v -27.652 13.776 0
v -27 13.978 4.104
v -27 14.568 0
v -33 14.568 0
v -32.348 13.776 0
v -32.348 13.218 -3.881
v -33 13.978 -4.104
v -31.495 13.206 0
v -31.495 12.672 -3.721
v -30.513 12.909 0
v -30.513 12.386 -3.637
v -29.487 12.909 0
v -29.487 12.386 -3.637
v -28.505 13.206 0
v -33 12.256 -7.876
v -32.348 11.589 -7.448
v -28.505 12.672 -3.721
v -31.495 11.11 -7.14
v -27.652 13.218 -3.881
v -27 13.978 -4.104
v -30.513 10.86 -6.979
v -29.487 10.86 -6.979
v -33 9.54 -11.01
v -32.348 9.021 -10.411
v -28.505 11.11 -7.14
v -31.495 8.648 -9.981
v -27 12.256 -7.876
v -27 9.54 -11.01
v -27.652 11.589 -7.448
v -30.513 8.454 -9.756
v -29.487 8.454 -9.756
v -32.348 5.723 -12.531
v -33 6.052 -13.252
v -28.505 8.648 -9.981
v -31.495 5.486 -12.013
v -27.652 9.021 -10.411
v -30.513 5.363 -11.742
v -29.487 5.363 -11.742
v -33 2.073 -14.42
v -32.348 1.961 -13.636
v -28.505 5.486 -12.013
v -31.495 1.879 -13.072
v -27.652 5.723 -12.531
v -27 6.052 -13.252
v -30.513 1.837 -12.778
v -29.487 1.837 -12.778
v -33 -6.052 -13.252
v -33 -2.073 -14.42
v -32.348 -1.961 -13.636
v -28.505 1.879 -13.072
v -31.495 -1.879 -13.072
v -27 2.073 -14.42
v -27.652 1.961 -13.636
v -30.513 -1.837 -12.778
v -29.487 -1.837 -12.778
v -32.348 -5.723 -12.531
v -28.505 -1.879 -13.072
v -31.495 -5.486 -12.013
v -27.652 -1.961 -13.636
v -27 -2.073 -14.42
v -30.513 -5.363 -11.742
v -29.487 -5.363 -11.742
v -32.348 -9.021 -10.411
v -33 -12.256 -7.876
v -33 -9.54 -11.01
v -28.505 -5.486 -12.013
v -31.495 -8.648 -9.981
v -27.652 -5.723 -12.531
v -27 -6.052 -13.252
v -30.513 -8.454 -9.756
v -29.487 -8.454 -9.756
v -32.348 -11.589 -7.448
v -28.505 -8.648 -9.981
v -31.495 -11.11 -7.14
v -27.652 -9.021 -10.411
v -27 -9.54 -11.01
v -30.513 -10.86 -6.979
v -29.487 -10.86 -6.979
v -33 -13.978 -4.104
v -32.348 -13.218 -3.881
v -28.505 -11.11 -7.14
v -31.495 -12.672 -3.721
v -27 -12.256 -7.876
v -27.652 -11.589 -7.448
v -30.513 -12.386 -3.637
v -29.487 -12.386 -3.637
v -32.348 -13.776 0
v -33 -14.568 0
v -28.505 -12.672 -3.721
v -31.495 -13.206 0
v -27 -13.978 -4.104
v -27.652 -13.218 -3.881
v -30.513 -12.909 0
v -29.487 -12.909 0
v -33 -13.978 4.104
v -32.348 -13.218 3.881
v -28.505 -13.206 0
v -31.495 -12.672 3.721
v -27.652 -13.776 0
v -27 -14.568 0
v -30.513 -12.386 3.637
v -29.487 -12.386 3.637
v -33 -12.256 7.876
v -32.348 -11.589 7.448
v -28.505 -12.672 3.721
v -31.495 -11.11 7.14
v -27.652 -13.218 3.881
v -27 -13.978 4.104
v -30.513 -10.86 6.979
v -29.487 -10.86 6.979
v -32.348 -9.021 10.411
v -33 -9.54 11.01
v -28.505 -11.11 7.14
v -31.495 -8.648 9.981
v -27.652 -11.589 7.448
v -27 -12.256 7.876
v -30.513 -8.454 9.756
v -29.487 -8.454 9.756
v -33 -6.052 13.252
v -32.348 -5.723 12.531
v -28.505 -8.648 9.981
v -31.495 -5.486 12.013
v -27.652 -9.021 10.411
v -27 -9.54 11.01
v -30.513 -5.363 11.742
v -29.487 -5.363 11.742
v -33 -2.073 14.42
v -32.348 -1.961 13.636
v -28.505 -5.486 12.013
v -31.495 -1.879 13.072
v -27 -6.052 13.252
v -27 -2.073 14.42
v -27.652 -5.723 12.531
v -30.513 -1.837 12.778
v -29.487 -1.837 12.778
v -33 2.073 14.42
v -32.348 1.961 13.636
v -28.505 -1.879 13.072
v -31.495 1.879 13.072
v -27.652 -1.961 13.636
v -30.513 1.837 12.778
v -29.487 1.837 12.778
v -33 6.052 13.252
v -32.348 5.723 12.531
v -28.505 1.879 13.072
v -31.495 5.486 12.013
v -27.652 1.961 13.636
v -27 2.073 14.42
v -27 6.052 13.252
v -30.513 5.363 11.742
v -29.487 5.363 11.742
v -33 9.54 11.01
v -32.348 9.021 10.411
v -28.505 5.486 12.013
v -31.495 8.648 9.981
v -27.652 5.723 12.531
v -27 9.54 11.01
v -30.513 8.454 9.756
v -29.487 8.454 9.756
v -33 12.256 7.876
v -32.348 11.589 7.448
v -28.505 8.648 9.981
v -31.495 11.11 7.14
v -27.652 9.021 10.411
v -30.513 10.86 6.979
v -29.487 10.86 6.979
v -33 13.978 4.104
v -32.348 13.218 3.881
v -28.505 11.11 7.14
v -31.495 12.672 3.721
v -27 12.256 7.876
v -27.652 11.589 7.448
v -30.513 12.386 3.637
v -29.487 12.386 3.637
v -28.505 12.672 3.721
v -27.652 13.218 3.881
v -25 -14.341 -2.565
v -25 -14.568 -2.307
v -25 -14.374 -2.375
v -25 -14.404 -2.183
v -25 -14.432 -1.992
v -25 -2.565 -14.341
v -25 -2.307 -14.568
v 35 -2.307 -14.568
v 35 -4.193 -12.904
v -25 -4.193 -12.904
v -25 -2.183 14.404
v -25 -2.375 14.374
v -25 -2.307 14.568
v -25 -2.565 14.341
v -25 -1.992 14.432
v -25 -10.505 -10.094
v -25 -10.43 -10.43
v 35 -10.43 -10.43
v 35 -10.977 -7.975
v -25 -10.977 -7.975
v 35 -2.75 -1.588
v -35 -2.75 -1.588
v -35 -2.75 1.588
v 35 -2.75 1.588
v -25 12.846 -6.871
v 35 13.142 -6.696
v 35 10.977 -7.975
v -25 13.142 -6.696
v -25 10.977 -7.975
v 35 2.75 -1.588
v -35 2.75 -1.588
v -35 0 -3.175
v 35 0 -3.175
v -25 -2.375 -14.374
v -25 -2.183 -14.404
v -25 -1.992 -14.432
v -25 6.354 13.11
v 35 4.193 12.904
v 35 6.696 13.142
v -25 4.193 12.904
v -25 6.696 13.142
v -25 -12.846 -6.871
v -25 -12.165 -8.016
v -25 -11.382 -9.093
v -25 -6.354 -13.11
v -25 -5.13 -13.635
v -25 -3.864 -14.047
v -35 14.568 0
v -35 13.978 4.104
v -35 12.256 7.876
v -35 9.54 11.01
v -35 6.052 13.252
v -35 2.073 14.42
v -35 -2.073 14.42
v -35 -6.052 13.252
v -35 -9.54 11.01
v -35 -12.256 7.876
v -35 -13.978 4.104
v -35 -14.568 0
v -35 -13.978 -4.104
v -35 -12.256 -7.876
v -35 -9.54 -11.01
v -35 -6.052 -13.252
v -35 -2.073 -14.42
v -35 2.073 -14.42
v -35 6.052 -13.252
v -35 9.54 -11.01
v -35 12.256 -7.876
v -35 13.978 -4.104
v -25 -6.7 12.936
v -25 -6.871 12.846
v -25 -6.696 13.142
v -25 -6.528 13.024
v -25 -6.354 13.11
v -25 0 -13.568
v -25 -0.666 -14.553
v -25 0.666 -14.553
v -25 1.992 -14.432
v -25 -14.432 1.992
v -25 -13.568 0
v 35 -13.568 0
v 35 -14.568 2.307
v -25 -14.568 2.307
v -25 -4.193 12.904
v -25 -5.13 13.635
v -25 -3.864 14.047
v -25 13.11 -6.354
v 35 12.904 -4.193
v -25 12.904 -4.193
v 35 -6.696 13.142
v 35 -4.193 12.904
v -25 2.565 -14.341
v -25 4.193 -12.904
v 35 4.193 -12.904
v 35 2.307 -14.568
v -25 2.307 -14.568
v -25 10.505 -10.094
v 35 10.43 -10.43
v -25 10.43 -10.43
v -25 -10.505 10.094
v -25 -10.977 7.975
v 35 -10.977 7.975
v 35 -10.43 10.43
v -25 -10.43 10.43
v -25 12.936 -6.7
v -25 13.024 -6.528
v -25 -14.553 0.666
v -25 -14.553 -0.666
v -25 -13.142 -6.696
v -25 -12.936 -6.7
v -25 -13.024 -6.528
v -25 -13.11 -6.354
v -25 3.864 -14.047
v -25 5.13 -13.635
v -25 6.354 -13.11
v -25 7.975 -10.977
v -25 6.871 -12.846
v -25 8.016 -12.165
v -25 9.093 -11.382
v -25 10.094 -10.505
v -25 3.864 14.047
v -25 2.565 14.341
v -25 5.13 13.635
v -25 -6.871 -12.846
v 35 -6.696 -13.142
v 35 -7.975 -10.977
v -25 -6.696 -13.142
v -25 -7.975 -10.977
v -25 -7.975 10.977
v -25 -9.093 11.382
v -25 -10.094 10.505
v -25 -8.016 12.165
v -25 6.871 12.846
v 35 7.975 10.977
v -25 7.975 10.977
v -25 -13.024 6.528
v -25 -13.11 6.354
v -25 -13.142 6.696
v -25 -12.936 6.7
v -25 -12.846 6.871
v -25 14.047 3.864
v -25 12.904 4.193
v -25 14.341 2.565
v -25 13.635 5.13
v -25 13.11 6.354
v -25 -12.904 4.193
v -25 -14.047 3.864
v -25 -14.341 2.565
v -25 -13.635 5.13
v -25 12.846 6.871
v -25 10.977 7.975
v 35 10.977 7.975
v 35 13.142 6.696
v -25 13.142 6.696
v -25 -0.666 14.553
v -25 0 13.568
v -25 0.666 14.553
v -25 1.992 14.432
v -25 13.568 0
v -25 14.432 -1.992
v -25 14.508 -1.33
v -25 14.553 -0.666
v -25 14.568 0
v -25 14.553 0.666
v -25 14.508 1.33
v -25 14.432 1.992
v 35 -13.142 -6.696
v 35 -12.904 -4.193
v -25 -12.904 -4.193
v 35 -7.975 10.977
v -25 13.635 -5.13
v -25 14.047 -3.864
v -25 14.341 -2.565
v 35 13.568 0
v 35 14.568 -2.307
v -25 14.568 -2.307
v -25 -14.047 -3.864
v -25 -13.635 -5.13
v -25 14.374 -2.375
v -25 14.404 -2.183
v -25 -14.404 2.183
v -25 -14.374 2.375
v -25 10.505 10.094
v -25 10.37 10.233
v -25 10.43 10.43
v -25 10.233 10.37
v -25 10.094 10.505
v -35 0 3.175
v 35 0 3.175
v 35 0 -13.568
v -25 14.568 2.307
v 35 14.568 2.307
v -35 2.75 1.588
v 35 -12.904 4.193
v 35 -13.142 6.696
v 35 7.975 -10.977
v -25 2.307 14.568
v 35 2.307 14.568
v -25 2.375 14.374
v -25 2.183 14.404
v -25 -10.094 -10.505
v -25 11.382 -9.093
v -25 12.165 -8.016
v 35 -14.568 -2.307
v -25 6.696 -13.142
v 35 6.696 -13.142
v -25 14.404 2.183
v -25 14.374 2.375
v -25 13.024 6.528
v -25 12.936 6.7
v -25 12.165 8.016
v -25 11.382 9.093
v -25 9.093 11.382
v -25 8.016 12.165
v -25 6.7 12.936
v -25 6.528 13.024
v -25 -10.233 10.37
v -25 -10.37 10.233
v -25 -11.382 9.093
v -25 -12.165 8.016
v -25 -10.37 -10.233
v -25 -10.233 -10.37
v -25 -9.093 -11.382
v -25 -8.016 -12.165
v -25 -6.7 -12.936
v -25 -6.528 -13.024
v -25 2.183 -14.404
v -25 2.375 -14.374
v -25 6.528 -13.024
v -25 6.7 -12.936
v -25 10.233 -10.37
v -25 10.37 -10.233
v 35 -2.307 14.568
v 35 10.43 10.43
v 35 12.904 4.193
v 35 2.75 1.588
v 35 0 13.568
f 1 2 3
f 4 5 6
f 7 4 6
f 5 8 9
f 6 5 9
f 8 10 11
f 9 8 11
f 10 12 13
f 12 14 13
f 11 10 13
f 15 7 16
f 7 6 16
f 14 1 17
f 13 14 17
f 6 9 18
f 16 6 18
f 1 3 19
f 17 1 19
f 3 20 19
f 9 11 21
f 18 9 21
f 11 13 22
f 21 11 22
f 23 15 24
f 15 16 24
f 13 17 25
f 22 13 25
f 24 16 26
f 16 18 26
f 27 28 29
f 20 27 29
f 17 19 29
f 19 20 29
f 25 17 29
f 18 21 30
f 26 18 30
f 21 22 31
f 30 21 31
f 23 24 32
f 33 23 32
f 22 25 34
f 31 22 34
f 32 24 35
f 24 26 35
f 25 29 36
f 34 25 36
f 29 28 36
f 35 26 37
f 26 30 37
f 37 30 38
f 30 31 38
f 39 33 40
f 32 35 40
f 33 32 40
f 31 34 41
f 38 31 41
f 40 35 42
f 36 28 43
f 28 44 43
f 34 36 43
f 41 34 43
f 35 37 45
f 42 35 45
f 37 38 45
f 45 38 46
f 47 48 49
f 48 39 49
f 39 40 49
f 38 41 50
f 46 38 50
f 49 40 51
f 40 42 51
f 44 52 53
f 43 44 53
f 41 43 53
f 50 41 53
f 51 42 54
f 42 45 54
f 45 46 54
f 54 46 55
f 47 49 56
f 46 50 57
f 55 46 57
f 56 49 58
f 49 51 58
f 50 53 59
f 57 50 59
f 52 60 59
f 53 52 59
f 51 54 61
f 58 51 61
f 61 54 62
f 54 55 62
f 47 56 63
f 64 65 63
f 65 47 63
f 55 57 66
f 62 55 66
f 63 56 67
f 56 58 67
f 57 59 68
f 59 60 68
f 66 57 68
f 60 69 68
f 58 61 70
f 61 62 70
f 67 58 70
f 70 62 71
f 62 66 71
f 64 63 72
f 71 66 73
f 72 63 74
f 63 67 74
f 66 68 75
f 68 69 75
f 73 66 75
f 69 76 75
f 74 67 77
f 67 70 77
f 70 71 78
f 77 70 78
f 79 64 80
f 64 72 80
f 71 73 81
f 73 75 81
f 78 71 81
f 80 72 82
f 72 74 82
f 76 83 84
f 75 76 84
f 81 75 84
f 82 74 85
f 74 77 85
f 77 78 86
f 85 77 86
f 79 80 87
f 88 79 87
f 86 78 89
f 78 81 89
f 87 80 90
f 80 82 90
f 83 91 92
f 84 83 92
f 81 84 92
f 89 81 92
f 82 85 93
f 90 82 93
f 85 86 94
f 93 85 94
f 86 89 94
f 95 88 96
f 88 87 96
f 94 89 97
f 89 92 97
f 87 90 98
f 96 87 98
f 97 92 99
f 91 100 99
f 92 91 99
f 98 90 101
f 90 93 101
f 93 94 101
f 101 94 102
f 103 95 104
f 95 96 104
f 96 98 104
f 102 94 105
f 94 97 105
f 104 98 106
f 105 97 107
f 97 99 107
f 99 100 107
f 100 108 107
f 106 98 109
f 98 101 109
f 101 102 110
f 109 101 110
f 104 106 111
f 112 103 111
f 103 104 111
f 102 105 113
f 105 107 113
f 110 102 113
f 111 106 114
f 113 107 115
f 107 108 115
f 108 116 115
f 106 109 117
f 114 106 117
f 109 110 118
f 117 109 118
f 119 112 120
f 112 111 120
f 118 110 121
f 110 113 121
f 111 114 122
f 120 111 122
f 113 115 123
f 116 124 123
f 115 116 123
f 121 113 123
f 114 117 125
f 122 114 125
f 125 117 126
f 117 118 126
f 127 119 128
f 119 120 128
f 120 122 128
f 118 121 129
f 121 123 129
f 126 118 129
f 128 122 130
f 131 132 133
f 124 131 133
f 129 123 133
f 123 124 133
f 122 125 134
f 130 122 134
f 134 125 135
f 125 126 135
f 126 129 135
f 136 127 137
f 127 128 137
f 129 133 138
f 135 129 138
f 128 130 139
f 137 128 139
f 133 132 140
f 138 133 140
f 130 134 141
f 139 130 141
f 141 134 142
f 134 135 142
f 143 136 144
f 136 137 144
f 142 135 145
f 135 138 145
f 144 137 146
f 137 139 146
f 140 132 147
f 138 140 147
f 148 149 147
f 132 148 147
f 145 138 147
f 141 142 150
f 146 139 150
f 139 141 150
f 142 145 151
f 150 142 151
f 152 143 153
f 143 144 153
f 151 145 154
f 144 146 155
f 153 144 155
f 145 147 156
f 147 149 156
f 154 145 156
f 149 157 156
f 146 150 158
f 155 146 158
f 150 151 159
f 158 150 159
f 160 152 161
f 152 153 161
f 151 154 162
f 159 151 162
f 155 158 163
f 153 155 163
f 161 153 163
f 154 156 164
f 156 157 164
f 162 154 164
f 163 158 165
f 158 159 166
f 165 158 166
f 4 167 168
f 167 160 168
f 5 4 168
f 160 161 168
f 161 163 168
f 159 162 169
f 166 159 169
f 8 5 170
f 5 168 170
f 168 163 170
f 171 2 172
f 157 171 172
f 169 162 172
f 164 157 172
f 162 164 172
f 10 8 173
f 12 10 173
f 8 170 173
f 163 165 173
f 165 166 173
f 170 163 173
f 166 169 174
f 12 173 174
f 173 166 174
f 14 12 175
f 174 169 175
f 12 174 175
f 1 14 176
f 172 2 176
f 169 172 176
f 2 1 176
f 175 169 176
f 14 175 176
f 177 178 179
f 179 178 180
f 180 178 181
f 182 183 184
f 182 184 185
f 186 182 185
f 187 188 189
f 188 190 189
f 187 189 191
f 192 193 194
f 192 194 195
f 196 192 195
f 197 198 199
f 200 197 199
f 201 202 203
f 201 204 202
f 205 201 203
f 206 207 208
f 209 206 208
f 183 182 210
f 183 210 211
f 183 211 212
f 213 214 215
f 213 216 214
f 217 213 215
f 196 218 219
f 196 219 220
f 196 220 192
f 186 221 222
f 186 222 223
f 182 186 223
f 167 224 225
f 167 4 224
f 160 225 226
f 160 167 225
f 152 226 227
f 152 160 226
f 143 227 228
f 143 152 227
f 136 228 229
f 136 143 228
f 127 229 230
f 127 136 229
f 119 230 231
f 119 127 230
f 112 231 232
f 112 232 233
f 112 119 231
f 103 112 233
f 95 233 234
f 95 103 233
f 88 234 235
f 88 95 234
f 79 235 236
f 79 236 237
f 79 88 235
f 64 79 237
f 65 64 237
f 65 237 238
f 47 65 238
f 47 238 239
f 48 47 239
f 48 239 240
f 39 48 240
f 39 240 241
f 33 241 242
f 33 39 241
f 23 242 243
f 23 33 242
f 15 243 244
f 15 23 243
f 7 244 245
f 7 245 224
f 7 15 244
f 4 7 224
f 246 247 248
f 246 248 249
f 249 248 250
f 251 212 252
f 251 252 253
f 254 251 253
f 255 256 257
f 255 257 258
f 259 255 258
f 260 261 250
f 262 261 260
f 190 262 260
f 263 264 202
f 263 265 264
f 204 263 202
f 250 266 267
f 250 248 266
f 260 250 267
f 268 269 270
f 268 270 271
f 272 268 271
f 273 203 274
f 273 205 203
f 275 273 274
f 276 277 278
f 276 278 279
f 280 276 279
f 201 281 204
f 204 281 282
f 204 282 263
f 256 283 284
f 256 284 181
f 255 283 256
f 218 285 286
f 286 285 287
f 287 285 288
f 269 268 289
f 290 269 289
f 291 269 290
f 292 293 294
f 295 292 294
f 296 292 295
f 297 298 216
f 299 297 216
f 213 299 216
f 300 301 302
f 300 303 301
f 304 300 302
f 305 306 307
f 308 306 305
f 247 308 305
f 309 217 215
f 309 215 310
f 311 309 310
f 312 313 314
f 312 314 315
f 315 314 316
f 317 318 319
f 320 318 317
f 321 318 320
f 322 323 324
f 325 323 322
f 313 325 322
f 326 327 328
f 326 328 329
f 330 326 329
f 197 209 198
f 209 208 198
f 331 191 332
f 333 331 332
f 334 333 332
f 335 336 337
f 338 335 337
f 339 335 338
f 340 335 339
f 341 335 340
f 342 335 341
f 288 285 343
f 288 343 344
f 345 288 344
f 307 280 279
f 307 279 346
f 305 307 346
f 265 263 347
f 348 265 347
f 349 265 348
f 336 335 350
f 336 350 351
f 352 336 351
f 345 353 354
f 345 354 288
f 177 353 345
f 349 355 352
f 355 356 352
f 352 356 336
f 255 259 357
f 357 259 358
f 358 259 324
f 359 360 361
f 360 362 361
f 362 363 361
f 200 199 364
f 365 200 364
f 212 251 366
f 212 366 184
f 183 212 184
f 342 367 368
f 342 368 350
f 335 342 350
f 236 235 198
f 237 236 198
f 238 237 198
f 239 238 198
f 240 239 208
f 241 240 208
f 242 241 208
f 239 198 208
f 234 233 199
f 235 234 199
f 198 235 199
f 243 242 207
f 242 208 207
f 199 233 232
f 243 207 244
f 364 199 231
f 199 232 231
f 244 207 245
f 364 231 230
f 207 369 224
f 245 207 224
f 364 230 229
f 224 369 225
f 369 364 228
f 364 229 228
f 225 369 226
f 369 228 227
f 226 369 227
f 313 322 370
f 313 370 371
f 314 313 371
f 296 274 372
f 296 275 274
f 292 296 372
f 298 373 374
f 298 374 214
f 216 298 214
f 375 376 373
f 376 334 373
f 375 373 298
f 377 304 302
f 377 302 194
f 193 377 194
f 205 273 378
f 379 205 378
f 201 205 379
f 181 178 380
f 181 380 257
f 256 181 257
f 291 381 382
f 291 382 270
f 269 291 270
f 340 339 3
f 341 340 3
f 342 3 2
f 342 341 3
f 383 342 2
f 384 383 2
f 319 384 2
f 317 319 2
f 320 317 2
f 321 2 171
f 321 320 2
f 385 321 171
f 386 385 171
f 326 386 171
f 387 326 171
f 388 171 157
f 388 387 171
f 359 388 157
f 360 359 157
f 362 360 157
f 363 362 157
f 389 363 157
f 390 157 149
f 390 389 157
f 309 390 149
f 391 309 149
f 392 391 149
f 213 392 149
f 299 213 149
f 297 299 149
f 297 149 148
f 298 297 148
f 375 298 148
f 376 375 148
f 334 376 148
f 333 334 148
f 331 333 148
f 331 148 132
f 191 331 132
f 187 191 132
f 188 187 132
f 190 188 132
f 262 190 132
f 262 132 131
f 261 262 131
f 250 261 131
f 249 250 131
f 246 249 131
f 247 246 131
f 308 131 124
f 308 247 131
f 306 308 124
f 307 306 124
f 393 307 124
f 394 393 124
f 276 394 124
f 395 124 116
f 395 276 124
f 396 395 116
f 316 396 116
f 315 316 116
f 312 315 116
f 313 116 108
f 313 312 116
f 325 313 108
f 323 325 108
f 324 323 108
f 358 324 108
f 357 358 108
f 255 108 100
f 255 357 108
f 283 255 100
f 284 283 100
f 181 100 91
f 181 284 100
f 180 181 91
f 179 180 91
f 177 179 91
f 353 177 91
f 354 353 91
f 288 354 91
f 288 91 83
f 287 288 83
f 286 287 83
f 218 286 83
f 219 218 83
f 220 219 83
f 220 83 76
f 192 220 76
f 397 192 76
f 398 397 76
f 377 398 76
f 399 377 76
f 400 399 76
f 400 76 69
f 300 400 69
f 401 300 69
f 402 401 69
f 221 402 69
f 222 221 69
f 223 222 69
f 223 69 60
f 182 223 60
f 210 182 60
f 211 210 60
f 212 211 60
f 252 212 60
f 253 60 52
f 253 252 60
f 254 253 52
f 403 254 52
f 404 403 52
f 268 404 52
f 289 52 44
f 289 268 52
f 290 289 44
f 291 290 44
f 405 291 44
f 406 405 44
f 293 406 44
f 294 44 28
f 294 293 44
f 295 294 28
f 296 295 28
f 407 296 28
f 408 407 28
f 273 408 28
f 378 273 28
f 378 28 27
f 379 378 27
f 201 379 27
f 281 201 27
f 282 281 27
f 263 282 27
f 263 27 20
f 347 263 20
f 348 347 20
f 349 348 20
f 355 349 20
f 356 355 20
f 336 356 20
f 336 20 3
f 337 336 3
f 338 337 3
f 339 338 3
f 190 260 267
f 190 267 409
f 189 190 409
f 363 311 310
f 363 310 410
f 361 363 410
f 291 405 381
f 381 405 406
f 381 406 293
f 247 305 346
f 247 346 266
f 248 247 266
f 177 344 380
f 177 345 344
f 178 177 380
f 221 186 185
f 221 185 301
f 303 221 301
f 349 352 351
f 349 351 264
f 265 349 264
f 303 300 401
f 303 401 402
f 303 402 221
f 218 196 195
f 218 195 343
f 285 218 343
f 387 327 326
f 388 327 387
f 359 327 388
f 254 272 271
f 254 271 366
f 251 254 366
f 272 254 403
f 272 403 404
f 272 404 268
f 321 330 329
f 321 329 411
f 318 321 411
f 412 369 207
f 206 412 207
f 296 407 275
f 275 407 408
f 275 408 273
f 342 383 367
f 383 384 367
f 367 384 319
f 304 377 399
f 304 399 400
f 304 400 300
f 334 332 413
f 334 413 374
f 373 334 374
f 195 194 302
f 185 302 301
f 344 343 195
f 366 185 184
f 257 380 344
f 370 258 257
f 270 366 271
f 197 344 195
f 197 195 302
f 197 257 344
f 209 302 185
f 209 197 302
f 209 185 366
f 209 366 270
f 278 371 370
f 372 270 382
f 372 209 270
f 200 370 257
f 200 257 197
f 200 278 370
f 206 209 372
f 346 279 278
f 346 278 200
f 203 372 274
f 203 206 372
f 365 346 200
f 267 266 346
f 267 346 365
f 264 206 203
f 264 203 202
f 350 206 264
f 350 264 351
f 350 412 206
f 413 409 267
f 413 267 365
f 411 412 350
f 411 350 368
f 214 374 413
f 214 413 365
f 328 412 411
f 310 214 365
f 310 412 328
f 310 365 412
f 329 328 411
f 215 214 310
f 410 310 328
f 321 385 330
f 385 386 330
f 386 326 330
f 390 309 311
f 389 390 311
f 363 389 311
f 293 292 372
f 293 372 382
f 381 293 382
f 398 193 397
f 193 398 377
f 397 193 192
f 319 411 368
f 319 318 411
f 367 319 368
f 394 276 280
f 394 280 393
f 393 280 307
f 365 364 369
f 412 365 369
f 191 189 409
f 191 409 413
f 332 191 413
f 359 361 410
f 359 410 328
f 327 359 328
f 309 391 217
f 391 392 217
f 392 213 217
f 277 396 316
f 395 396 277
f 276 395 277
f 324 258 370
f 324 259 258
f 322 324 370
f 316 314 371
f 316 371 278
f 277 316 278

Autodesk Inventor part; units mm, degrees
ref_plane "YZ Plane" through (0, 0, 0) normal (1, 0, 0) x (0, 1, 0)
ref_plane "XZ Plane" through (0, 0, 0) normal (0, 1, 0) x (-1, 0, 0)
ref_plane "XY Plane" through (0, 0, 0) normal (0, 0, 1) x (1, 0, 0)
sketch "Sketch1" plane through (0, 0, 0) normal (1, 0, 0) x (0, 1, 0)
  circle A0 centre (0, 0) radius 14.75 construction
  line L0 (2.75, -1.5877) -> (0, -3.1754)
  line L1 (0, -3.1754) -> (-2.75, -1.5877)
  line L2 (-2.75, -1.5877) -> (-2.75, 1.5877)
  line L3 (-2.75, 1.5877) -> (0, 3.1754)
  line L4 (0, 3.1754) -> (2.75, 1.5877)
  line L5 (2.75, 1.5877) -> (2.75, -1.5877)
  line L6 (14.5684, 2.3074) -> (14.5684, -2.3074) construction
  line L7 (14.5684, 2.3074) -> (0, 0) construction
  line L8 (0, 0) -> (14.5684, -2.3074) construction
  line L9 (14.5684, 2.3074) -> (13.5684, 0)
  line L10 (13.5684, 0) -> (14.5684, -2.3074)
  line L11 (13.5684, 0) -> (14.5684, 0) construction
  line L12 (13.1423, 6.6964) -> (12.9043, 4.1929)
  line L13 (12.9043, 4.1929) -> (14.5684, 2.3074)
  line L14 (10.4298, 10.4298) -> (10.9771, 7.9753)
  line L15 (10.9771, 7.9753) -> (13.1423, 6.6964)
  line L16 (6.6964, 13.1423) -> (7.9753, 10.9771)
  line L17 (7.9753, 10.9771) -> (10.4298, 10.4298)
  line L18 (2.3074, 14.5684) -> (4.1929, 12.9043)
  line L19 (4.1929, 12.9043) -> (6.6964, 13.1423)
  line L20 (-2.3074, 14.5684) -> (0, 13.5684)
  line L21 (0, 13.5684) -> (2.3074, 14.5684)
  line L22 (-6.6964, 13.1423) -> (-4.1929, 12.9043)
  line L23 (-4.1929, 12.9043) -> (-2.3074, 14.5684)
  line L24 (-10.4298, 10.4298) -> (-7.9753, 10.9771)
  line L25 (-7.9753, 10.9771) -> (-6.6964, 13.1423)
  line L26 (-13.1423, 6.6964) -> (-10.9771, 7.9753)
  line L27 (-10.9771, 7.9753) -> (-10.4298, 10.4298)
  line L28 (-14.5684, 2.3074) -> (-12.9043, 4.1929)
  line L29 (-12.9043, 4.1929) -> (-13.1423, 6.6964)
  line L30 (-14.5684, -2.3074) -> (-13.5684, 0)
  line L31 (-13.5684, 0) -> (-14.5684, 2.3074)
  line L32 (-13.1423, -6.6964) -> (-12.9043, -4.1929)
  line L33 (-12.9043, -4.1929) -> (-14.5684, -2.3074)
  line L34 (-10.4298, -10.4298) -> (-10.9771, -7.9753)
  line L35 (-10.9771, -7.9753) -> (-13.1423, -6.6964)
  line L36 (-6.6964, -13.1423) -> (-7.9753, -10.9771)
  line L37 (-7.9753, -10.9771) -> (-10.4298, -10.4298)
  line L38 (-2.3074, -14.5684) -> (-4.1929, -12.9043)
  line L39 (-4.1929, -12.9043) -> (-6.6964, -13.1423)
  line L40 (2.3074, -14.5684) -> (0, -13.5684)
  line L41 (0, -13.5684) -> (-2.3074, -14.5684)
  line L42 (6.6964, -13.1423) -> (4.1929, -12.9043)
  line L43 (4.1929, -12.9043) -> (2.3074, -14.5684)
  line L44 (10.4298, -10.4298) -> (7.9753, -10.9771)
  line L45 (7.9753, -10.9771) -> (6.6964, -13.1423)
  line L46 (13.1423, -6.6964) -> (10.9771, -7.9753)
  line L47 (10.9771, -7.9753) -> (10.4298, -10.4298)
  line L48 (14.5684, -2.3074) -> (12.9043, -4.1929)
  line L49 (12.9043, -4.1929) -> (13.1423, -6.6964)
  dimension "d0" = 29.5
  dimension "d1" = 5.5
  dimension "d2" = 18
  dimension "d3" = 1
  dimension "d6" = 360
extrude "Extrusion1" add sketch "Sketch1" along normal mid plane 70
sketch "Sketch2" plane through (0, 0, 0) normal (0, 0, 1) x (1, 0, 0)
  line L0 (-35, 14.5684) -> (35, 14.5684) projected
  line L1 (-35, -14.5684) -> (35, -14.5684) projected
  line L2 (-35, 14.5684) -> (-25, 14.5684)
  line L3 (-25, 14.5684) -> (-25, -14.5684)
  line L4 (-25, -14.5684) -> (-35, -14.5684)
  line L5 (-35, -14.5684) -> (-35, 14.5684)
  line L6 (-35, 4.5684) -> (-25, 4.5684)
  line L7 (-35, 14.5684) -> (-35, 14.5684)
  line L8 (-35, 14.5684) -> (-33, 14.5684)
  line L9 (-25, 14.5684) -> (-25, 14.5684)
  line L10 (-25, 14.5684) -> (-27, 14.5684)
  arc A0 (-33, 14.5684) -> (-27, 14.5684) centre (-30, 16.3712) ccw
  line L11 (-35, 0) -> (35, 0) projected
  line L12 (-35, 0) -> (-25, 0)
  line L13 (-35, 14.5684) -> (-25, 14.5684)
  line L14 (-25, 14.5684) -> (-25, 20.6242)
  line L15 (-25, 20.6242) -> (-35, 20.6242)
  line L16 (-35, 20.6242) -> (-35, 14.5684)
  point P0 (0, 0)
  dimension "d11" = 0
  dimension "d12" = 10
  dimension "d13" = 10
  dimension "d14" = 2
  dimension "d15" = 0
  dimension "d16" = 2
  dimension "d17" = 0
  dimension "d18" = 3.5
revolve "Revolution2" cut sketch "Sketch2" angle 360 about axis through (-35, 0, 0) along (1, 0, 0) contours L16 L15 L14 L0 | L0 A0 L3 L6 L5 | L0 A0
revolve "Revolution1" add sketch "Sketch2" angle 360 about axis through (-35, 0, 0) along (1, 0, 0) contours L0 A0 L3 L6 L5
properties part number "SolidRoller" material "PC/ABS Plastic"
